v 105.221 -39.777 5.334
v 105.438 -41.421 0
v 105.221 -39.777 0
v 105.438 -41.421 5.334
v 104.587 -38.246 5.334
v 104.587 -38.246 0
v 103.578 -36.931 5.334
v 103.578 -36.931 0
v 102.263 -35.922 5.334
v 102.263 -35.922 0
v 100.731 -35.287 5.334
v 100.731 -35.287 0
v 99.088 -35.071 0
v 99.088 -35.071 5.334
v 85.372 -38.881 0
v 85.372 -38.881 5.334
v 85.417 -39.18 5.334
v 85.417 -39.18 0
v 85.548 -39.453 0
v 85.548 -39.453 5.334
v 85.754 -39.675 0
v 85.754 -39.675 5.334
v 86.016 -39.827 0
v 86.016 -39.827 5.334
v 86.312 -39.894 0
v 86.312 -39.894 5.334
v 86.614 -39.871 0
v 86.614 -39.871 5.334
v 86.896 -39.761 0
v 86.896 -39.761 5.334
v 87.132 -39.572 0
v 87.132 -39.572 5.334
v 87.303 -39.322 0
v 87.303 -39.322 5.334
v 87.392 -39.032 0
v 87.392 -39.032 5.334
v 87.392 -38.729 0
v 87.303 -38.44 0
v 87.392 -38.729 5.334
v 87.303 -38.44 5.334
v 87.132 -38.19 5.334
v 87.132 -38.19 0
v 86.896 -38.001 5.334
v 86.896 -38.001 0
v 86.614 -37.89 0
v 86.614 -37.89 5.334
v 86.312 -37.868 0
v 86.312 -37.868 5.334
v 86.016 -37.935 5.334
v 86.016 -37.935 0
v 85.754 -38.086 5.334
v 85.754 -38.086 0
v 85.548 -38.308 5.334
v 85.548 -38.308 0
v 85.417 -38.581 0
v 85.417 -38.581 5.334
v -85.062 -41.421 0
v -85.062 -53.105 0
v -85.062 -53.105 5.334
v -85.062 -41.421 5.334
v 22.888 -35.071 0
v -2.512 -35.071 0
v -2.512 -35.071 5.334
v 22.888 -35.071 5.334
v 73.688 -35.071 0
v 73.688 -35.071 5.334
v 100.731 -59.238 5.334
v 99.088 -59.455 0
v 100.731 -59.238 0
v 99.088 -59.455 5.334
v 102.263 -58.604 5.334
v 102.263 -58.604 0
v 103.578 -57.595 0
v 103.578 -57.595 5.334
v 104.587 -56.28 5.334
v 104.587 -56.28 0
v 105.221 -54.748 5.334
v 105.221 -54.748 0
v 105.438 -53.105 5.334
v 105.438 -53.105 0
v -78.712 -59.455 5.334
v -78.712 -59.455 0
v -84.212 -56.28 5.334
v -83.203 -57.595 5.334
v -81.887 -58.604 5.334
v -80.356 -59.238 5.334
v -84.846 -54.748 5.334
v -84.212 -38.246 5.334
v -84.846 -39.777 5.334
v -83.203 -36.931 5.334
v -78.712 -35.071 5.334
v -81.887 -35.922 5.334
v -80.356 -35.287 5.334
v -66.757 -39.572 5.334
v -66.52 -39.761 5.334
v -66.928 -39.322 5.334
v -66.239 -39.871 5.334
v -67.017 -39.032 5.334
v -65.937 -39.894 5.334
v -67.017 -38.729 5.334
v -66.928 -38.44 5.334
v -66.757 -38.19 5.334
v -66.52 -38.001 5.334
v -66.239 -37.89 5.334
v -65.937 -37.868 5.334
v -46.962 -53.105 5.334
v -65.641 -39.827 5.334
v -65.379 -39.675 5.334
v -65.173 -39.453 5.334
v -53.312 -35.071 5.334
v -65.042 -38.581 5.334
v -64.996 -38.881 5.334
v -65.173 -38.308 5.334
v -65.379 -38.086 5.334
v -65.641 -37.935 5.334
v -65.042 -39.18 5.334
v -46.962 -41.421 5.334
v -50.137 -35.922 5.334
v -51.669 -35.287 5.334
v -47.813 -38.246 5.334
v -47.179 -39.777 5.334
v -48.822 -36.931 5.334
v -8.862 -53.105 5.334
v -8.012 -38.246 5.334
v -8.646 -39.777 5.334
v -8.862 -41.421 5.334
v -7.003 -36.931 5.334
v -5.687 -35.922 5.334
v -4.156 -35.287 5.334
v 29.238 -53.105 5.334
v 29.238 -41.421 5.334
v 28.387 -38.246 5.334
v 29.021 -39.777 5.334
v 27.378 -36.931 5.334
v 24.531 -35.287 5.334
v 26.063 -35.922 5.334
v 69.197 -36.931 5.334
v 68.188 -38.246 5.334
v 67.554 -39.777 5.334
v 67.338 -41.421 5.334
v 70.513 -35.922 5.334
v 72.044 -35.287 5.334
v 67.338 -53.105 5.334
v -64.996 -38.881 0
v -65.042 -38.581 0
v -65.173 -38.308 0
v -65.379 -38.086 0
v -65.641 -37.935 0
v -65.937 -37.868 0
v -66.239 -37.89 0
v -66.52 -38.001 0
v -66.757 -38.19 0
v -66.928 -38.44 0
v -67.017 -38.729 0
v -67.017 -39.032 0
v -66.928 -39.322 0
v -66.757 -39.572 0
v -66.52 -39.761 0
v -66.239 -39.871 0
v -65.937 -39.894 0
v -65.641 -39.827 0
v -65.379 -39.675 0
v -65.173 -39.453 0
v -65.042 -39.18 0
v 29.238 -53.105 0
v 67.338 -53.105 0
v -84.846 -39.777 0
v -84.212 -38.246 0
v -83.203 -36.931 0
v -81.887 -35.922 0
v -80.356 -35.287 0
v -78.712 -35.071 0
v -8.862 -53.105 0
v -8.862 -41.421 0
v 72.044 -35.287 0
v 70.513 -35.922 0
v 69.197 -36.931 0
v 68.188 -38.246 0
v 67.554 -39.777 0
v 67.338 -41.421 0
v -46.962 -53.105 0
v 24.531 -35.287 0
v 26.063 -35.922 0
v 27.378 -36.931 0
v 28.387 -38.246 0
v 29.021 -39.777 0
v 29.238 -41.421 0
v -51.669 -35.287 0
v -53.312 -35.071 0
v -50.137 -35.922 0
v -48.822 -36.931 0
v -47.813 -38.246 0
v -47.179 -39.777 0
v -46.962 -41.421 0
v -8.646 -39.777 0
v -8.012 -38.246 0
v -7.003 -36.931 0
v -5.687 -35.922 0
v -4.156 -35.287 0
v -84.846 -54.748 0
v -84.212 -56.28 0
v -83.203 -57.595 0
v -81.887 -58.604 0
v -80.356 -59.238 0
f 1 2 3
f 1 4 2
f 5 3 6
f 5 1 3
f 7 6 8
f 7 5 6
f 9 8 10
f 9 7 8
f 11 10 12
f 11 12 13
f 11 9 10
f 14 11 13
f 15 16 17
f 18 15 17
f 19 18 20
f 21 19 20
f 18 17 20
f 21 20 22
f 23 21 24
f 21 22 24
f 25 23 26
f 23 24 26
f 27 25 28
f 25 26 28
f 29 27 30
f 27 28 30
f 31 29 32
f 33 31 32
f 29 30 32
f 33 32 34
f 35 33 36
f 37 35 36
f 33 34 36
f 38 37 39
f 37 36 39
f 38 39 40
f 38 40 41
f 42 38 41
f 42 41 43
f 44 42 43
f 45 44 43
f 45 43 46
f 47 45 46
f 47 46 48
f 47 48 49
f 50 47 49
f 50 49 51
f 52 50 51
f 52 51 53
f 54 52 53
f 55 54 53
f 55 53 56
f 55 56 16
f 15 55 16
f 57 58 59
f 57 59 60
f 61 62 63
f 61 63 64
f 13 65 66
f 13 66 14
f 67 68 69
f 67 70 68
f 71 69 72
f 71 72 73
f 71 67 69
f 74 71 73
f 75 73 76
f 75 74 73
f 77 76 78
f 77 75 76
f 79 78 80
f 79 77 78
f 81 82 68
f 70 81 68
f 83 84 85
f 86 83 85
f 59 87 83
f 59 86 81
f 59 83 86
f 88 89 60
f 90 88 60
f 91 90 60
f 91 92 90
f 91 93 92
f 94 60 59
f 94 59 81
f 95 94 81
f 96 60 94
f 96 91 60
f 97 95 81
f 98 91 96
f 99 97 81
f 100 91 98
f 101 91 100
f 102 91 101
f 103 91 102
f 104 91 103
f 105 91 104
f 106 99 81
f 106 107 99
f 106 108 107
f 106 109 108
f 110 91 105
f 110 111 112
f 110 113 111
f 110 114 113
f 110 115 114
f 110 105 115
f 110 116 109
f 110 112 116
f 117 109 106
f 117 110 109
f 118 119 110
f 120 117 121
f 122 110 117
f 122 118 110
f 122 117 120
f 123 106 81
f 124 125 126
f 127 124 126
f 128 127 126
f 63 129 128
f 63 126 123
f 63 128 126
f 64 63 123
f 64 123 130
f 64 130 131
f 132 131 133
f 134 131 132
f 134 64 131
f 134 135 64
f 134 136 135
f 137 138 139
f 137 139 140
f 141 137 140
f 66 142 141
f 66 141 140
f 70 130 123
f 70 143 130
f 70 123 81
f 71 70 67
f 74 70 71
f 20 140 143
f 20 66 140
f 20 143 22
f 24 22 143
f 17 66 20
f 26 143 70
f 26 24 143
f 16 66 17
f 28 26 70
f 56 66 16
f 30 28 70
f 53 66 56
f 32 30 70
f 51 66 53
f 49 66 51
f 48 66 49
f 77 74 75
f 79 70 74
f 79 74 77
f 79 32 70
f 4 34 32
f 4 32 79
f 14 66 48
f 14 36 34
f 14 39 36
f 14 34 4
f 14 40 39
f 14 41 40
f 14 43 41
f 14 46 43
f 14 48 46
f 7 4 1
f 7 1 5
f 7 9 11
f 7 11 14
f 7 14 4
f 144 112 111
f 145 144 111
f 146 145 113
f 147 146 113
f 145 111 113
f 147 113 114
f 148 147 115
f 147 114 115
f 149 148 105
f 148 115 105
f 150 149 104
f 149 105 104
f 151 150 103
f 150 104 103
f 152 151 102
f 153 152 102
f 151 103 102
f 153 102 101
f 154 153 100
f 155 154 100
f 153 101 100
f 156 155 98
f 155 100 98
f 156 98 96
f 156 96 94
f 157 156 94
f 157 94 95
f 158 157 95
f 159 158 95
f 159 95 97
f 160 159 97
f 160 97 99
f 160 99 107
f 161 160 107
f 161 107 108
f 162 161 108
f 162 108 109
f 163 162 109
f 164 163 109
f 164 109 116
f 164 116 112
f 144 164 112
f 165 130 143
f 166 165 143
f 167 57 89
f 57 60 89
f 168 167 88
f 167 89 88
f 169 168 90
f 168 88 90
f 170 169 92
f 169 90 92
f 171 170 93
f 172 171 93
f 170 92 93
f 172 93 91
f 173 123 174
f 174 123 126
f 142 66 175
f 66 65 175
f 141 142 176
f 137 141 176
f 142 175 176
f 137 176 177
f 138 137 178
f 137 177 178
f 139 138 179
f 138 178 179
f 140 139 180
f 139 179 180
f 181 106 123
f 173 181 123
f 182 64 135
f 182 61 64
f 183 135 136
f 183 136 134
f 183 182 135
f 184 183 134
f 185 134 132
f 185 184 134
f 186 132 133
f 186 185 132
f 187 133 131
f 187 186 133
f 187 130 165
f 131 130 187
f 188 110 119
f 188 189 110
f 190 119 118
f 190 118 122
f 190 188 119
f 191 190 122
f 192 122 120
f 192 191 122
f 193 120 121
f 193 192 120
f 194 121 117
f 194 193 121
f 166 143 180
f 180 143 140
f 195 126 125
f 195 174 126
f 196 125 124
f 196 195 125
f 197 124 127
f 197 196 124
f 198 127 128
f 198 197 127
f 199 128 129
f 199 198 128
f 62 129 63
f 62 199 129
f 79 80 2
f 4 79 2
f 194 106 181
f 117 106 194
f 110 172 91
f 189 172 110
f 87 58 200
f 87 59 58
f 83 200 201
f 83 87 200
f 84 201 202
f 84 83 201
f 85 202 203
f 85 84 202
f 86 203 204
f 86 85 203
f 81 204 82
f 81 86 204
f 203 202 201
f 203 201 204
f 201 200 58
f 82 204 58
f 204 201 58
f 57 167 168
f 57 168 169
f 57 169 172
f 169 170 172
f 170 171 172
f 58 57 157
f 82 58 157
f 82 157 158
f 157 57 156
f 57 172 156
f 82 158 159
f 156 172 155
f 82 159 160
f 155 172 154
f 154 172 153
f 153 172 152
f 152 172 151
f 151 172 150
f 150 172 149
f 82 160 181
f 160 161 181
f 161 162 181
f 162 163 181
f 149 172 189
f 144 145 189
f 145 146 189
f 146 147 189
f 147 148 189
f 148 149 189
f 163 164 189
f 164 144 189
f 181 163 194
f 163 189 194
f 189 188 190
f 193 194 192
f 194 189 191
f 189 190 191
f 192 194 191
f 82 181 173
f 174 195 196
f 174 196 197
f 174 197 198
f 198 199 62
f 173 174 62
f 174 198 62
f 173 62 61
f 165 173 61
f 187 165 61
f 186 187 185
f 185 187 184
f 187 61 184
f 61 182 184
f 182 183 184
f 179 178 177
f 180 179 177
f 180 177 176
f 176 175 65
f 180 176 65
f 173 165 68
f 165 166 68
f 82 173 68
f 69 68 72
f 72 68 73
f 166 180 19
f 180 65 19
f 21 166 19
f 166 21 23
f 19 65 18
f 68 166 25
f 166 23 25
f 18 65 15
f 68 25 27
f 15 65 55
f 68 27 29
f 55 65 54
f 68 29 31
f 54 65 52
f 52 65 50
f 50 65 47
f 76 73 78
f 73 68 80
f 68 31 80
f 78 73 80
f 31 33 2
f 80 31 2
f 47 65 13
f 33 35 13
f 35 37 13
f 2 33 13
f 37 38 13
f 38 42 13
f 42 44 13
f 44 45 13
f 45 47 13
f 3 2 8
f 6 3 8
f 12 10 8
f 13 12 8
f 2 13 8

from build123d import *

# Parameters (mm, degrees)
SKETCH1_W           = 190.5
SKETCH1_H           = 24.384
BOSS_EXTRUDE1_DEPTH = 5.334
SKETCH3_W           = 38.1
SKETCH3_H           = 18.034
CUT_EXTRUDE1_DEPTH  = 122.162721385
SKETCH4_R           = 1.016
CUT_EXTRUDE2_DEPTH  = 122.162721385
FILLET1_R           = 6.35


with BuildPart() as part:
    # Sketch1 → Boss-Extrude1 (new body)
    with BuildSketch(Plane.XY):
        with Locations((10.187554582, -47.262819662)):
            Rectangle(SKETCH1_W, SKETCH1_H)
    extrude(amount=BOSS_EXTRUDE1_DEPTH)

    # Sketch3 → Cut-Extrude1 (cut, through all)
    with BuildSketch(Plane.XY.offset(5.334)):
        with Locations((-27.912445418, -44.087819662)):
            Rectangle(SKETCH3_W, SKETCH3_H)
        with Locations((48.287554582, -44.087819662)):
            Rectangle(SKETCH3_W, SKETCH3_H)
    extrude(amount=-CUT_EXTRUDE1_DEPTH, mode=Mode.SUBTRACT)

    # Sketch4 → Cut-Extrude2 (cut, through all)
    with BuildSketch(Plane.XY.offset(5.334)):
        with Locations((-66.012445418, -38.880819662)):
            Circle(SKETCH4_R)
        with Locations(Location((86.387554582, -38.880819662, 0), (0, 0, 180))):
            Circle(SKETCH4_R)
    extrude(amount=-CUT_EXTRUDE2_DEPTH, mode=Mode.SUBTRACT)

    # Fillet1
    fillet1_edges = [part.edges().sort_by_distance(p)[0] for p in [
        (-46.962445418, -35.070819662, 2.667),
        (-8.862445418, -35.070819662, 2.667),
        (29.237554582, -35.070819662, 2.667),
        (67.337554582, -35.070819662, 2.667),
        (-85.062445418, -35.070819662, 2.667),
        (105.437554582, -35.070819662, 2.667),
        (105.437554582, -59.454819662, 2.667),
        (-85.062445418, -59.454819662, 2.667),
    ]]
    fillet(fillet1_edges, radius=FILLET1_R)


solid = part.part
